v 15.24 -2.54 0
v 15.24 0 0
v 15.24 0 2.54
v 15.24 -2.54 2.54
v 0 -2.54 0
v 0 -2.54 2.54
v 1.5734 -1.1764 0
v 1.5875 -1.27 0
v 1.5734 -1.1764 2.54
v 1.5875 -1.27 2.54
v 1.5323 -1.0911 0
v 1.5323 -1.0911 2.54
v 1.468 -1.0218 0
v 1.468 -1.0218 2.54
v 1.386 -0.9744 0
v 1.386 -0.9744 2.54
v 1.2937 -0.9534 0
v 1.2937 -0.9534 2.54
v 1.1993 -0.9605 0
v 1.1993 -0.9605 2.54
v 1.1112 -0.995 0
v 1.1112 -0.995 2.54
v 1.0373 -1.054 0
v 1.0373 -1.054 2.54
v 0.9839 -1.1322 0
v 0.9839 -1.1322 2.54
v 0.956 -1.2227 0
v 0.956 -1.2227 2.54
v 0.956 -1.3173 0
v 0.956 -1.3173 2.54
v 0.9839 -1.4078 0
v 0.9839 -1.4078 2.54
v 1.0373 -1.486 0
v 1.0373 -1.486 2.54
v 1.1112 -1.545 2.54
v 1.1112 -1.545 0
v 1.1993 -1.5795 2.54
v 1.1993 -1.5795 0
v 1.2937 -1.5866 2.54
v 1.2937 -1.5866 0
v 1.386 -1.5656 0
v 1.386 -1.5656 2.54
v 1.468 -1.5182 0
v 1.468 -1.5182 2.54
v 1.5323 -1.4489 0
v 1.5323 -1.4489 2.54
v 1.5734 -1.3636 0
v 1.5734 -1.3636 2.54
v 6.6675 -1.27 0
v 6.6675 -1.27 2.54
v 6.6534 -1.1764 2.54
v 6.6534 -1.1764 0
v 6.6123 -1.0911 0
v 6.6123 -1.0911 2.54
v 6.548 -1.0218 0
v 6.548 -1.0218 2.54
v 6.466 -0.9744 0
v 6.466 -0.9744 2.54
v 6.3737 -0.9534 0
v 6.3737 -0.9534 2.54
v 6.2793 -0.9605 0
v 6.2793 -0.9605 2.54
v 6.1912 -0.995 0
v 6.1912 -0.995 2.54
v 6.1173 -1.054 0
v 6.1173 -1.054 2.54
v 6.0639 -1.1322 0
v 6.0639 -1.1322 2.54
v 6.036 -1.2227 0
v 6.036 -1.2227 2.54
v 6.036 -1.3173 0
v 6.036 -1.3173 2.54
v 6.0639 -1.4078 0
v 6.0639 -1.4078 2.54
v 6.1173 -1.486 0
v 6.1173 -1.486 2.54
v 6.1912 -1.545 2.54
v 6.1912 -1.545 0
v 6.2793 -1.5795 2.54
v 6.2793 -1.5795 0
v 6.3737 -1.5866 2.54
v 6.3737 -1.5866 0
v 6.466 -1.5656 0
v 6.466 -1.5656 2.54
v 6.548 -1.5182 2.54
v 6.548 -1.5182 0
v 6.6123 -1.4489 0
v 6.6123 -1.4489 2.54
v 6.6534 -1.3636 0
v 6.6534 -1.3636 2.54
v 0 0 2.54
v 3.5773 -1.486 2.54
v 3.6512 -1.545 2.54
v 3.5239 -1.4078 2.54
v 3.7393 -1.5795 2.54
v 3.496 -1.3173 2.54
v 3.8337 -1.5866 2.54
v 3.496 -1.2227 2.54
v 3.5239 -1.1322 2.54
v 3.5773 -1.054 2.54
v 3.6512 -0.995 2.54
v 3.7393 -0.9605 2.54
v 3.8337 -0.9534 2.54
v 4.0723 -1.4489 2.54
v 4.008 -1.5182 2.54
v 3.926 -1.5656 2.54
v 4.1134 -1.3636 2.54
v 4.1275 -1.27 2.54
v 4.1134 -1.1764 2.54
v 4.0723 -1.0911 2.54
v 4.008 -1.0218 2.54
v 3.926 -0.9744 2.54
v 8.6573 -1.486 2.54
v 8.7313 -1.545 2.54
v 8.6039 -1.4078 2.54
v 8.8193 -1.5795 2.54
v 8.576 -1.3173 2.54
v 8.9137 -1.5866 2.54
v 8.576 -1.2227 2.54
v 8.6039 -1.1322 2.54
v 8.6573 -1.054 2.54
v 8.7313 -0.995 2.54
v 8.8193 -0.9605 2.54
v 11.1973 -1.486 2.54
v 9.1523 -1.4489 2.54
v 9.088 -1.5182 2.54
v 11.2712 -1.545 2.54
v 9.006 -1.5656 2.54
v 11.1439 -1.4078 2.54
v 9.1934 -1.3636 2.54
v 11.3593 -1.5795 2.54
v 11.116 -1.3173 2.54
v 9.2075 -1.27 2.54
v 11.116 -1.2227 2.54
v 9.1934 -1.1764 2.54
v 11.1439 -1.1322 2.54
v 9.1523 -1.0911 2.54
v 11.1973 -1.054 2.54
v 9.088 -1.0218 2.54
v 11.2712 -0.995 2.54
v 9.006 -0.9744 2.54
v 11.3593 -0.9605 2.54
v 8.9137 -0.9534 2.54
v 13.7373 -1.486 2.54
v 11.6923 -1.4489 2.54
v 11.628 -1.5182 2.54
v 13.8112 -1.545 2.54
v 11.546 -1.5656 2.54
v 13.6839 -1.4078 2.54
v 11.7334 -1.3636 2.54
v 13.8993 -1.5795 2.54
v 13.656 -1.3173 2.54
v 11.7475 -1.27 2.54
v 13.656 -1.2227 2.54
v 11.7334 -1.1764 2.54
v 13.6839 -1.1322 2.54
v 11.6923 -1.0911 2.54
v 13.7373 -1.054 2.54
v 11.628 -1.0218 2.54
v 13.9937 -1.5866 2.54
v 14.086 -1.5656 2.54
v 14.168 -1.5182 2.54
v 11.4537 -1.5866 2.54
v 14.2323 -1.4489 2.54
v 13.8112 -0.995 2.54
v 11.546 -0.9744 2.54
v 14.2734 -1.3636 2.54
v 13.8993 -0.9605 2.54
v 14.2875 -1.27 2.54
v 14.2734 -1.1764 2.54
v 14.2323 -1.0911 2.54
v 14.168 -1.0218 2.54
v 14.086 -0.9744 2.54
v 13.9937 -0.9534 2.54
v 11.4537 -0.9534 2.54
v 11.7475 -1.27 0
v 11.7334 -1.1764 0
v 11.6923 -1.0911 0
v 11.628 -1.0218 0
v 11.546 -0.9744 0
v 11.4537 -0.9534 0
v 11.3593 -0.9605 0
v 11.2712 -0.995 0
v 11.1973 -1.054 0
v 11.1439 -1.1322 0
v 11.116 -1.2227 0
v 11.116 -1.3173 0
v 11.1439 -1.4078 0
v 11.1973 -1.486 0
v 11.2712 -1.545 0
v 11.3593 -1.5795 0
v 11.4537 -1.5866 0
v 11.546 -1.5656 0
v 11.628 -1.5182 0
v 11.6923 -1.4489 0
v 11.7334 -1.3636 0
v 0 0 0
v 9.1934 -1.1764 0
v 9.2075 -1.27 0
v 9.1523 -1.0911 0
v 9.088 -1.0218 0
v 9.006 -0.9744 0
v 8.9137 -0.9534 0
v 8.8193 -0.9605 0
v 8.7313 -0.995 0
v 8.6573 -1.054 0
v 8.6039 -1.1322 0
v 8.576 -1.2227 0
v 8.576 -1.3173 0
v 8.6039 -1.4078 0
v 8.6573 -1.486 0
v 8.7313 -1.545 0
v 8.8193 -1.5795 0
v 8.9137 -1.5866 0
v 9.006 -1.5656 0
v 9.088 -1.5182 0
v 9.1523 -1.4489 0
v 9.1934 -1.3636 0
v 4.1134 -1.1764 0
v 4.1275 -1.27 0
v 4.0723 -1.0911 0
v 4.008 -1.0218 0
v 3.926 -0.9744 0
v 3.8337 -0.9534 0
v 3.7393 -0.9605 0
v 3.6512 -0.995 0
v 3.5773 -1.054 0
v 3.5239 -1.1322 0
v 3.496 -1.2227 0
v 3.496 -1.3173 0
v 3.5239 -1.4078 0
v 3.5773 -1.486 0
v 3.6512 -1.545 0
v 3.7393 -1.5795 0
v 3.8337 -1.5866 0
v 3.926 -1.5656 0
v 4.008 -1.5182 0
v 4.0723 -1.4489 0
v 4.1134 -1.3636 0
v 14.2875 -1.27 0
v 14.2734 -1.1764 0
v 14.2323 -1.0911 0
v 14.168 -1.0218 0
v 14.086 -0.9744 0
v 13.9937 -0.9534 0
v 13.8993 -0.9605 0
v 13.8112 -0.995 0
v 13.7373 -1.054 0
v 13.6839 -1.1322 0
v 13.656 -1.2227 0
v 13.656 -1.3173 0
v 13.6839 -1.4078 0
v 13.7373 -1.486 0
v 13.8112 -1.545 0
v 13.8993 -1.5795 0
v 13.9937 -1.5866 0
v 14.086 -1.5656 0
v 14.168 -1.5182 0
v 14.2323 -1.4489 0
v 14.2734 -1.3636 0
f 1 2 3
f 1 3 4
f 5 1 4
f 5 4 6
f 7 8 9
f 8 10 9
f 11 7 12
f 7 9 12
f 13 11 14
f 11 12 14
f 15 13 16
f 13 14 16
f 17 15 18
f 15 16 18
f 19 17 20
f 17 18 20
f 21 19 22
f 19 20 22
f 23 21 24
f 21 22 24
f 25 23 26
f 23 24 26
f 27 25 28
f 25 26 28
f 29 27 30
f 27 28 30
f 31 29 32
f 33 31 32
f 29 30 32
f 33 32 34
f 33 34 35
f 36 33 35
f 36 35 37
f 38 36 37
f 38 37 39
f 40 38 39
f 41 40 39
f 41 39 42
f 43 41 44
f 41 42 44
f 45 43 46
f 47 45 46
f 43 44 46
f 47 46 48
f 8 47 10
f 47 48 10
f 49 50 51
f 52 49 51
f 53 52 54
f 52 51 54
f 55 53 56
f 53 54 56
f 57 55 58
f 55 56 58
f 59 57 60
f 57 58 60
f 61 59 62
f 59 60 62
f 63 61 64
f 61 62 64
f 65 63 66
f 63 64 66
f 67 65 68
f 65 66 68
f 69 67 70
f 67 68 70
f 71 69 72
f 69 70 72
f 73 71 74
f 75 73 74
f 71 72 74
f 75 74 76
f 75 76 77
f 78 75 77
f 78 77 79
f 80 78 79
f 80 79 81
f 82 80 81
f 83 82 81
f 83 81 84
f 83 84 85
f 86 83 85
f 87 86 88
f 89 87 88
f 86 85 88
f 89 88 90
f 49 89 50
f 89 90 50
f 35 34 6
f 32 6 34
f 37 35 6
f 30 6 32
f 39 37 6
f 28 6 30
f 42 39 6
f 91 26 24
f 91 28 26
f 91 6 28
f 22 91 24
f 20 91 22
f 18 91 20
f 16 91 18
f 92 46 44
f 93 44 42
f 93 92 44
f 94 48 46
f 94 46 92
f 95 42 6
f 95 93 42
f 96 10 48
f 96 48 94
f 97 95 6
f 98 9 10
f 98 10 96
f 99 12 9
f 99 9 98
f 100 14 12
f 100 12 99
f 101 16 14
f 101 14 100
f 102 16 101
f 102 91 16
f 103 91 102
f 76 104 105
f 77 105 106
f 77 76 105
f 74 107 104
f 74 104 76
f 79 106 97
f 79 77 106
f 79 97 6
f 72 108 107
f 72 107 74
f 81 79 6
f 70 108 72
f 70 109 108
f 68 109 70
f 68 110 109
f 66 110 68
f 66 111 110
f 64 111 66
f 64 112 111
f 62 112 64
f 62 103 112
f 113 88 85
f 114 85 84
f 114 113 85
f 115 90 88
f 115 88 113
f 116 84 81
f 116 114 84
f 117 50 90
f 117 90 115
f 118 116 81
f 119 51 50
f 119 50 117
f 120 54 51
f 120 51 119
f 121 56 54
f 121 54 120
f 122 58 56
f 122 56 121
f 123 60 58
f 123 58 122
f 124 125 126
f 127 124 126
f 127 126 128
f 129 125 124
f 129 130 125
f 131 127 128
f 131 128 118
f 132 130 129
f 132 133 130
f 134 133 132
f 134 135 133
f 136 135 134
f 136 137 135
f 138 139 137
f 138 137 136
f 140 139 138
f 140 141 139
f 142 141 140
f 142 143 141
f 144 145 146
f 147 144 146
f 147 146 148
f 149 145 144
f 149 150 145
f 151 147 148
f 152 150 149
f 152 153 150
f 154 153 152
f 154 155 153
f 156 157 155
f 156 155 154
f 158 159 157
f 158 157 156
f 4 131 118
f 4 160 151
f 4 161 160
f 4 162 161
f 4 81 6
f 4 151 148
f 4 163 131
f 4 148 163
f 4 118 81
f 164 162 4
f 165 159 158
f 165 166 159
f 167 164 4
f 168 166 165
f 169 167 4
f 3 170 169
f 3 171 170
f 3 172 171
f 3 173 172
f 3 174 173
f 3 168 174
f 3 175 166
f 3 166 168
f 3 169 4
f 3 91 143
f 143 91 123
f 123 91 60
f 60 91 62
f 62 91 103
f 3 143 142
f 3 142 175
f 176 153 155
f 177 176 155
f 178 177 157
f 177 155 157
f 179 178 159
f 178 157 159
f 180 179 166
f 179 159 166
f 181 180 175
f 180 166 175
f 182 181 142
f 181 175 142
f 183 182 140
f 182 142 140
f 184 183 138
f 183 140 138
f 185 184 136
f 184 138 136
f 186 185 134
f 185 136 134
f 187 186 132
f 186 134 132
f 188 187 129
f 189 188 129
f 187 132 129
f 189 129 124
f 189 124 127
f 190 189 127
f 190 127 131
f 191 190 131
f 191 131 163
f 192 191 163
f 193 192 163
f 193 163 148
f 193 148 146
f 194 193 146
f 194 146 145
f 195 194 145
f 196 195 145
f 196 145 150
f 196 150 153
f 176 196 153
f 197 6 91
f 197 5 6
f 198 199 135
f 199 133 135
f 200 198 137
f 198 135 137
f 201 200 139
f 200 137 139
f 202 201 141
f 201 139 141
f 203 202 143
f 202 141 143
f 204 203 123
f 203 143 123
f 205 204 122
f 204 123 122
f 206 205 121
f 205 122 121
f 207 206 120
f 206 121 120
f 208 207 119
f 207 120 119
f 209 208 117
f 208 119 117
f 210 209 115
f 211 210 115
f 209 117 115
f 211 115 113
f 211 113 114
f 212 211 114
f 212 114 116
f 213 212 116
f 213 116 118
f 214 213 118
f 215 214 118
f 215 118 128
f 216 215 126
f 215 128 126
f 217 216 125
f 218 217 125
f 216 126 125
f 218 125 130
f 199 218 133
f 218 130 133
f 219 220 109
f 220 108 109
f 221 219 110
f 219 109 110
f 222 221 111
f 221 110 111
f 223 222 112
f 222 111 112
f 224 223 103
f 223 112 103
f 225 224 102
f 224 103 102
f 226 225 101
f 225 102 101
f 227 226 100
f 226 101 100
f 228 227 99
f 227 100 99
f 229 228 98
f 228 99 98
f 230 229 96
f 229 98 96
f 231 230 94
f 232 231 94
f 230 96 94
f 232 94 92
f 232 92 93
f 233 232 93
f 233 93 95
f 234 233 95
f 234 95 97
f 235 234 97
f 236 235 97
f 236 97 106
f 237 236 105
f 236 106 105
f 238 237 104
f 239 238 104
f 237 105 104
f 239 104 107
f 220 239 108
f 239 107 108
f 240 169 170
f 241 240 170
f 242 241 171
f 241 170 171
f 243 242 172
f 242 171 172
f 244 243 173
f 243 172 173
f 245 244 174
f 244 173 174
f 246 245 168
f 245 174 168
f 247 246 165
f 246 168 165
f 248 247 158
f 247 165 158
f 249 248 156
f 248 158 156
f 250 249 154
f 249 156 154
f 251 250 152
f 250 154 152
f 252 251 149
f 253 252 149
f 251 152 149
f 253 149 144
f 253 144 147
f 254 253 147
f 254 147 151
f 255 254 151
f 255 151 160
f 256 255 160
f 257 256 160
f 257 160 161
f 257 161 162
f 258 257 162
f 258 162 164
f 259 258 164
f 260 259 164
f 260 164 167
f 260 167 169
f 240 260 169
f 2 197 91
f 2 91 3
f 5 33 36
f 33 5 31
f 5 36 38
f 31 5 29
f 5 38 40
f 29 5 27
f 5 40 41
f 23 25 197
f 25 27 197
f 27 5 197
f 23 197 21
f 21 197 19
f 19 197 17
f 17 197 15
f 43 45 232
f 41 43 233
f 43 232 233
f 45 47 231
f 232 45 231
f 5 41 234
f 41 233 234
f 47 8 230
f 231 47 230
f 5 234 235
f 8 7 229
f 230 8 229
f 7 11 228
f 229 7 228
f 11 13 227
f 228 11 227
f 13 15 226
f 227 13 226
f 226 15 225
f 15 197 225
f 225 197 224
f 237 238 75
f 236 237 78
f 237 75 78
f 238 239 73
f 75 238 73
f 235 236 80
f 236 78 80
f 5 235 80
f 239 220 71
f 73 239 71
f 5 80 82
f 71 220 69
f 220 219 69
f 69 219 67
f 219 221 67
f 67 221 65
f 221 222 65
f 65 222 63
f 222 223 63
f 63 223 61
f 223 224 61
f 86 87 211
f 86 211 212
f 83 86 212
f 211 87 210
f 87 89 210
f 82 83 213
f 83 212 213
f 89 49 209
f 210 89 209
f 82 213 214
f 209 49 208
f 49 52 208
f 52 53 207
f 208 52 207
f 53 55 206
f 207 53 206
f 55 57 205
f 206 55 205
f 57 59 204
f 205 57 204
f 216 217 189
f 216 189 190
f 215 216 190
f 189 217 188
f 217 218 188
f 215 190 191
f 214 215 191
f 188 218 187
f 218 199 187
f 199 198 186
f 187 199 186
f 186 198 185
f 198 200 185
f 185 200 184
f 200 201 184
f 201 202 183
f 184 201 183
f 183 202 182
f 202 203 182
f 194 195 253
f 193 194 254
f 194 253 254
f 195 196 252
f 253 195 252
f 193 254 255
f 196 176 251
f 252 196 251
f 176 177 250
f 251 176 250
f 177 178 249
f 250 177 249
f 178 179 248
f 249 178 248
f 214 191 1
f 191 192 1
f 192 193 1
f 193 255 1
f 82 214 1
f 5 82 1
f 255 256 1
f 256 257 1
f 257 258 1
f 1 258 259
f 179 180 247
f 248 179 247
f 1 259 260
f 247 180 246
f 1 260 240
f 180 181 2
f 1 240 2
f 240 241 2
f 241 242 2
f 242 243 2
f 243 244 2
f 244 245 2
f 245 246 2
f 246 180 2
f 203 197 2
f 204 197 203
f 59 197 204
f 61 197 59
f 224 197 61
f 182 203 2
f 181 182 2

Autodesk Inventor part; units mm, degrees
ref_plane "YZ Plane" through (0, 0, 0) normal (1, 0, 0) x (0, 1, 0)
ref_plane "XZ Plane" through (0, 0, 0) normal (0, 1, 0) x (-1, 0, 0)
ref_plane "XY Plane" through (0, 0, 0) normal (0, 0, 1) x (1, 0, 0)
sketch "Sketch1" plane through (0, 0, 0) normal (0, 0, 1) x (1, 0, 0)
  line L0 (0, 0) -> (15.24, 0)
  line L1 (15.24, 0) -> (15.24, -2.54)
  line L2 (15.24, -2.54) -> (0, -2.54)
  line L3 (0, -2.54) -> (0, 0)
  dimension "d0" = 15.24
  dimension "d1" = 2.54
extrude "Extrusion1" add sketch "Sketch1" along normal blind 2.54
sketch "Sketch2" plane through (0, 0, 2.54) normal (0, 0, 1) x (1, 0, 0)
  line L0 (15.24, 0) -> (0, 0) projected
  line L1 (0, 0) -> (0, -2.54) projected
  circle A0 centre (1.27, -1.27) radius 0.3175
  circle A1 centre (3.81, -1.27) radius 0.3175
  circle A2 centre (6.35, -1.27) radius 0.3175
  circle A3 centre (8.89, -1.27) radius 0.3175
  circle A4 centre (11.43, -1.27) radius 0.3175
  circle A5 centre (13.97, -1.27) radius 0.3175
  dimension "d4" = 0.635
  dimension "d6" = 1.27
  dimension "d9" = 2.54
extrude "Extrusion2" cut sketch "Sketch2" against normal blind 2.54
properties part number "Main Header" material "ABS Plastic"
